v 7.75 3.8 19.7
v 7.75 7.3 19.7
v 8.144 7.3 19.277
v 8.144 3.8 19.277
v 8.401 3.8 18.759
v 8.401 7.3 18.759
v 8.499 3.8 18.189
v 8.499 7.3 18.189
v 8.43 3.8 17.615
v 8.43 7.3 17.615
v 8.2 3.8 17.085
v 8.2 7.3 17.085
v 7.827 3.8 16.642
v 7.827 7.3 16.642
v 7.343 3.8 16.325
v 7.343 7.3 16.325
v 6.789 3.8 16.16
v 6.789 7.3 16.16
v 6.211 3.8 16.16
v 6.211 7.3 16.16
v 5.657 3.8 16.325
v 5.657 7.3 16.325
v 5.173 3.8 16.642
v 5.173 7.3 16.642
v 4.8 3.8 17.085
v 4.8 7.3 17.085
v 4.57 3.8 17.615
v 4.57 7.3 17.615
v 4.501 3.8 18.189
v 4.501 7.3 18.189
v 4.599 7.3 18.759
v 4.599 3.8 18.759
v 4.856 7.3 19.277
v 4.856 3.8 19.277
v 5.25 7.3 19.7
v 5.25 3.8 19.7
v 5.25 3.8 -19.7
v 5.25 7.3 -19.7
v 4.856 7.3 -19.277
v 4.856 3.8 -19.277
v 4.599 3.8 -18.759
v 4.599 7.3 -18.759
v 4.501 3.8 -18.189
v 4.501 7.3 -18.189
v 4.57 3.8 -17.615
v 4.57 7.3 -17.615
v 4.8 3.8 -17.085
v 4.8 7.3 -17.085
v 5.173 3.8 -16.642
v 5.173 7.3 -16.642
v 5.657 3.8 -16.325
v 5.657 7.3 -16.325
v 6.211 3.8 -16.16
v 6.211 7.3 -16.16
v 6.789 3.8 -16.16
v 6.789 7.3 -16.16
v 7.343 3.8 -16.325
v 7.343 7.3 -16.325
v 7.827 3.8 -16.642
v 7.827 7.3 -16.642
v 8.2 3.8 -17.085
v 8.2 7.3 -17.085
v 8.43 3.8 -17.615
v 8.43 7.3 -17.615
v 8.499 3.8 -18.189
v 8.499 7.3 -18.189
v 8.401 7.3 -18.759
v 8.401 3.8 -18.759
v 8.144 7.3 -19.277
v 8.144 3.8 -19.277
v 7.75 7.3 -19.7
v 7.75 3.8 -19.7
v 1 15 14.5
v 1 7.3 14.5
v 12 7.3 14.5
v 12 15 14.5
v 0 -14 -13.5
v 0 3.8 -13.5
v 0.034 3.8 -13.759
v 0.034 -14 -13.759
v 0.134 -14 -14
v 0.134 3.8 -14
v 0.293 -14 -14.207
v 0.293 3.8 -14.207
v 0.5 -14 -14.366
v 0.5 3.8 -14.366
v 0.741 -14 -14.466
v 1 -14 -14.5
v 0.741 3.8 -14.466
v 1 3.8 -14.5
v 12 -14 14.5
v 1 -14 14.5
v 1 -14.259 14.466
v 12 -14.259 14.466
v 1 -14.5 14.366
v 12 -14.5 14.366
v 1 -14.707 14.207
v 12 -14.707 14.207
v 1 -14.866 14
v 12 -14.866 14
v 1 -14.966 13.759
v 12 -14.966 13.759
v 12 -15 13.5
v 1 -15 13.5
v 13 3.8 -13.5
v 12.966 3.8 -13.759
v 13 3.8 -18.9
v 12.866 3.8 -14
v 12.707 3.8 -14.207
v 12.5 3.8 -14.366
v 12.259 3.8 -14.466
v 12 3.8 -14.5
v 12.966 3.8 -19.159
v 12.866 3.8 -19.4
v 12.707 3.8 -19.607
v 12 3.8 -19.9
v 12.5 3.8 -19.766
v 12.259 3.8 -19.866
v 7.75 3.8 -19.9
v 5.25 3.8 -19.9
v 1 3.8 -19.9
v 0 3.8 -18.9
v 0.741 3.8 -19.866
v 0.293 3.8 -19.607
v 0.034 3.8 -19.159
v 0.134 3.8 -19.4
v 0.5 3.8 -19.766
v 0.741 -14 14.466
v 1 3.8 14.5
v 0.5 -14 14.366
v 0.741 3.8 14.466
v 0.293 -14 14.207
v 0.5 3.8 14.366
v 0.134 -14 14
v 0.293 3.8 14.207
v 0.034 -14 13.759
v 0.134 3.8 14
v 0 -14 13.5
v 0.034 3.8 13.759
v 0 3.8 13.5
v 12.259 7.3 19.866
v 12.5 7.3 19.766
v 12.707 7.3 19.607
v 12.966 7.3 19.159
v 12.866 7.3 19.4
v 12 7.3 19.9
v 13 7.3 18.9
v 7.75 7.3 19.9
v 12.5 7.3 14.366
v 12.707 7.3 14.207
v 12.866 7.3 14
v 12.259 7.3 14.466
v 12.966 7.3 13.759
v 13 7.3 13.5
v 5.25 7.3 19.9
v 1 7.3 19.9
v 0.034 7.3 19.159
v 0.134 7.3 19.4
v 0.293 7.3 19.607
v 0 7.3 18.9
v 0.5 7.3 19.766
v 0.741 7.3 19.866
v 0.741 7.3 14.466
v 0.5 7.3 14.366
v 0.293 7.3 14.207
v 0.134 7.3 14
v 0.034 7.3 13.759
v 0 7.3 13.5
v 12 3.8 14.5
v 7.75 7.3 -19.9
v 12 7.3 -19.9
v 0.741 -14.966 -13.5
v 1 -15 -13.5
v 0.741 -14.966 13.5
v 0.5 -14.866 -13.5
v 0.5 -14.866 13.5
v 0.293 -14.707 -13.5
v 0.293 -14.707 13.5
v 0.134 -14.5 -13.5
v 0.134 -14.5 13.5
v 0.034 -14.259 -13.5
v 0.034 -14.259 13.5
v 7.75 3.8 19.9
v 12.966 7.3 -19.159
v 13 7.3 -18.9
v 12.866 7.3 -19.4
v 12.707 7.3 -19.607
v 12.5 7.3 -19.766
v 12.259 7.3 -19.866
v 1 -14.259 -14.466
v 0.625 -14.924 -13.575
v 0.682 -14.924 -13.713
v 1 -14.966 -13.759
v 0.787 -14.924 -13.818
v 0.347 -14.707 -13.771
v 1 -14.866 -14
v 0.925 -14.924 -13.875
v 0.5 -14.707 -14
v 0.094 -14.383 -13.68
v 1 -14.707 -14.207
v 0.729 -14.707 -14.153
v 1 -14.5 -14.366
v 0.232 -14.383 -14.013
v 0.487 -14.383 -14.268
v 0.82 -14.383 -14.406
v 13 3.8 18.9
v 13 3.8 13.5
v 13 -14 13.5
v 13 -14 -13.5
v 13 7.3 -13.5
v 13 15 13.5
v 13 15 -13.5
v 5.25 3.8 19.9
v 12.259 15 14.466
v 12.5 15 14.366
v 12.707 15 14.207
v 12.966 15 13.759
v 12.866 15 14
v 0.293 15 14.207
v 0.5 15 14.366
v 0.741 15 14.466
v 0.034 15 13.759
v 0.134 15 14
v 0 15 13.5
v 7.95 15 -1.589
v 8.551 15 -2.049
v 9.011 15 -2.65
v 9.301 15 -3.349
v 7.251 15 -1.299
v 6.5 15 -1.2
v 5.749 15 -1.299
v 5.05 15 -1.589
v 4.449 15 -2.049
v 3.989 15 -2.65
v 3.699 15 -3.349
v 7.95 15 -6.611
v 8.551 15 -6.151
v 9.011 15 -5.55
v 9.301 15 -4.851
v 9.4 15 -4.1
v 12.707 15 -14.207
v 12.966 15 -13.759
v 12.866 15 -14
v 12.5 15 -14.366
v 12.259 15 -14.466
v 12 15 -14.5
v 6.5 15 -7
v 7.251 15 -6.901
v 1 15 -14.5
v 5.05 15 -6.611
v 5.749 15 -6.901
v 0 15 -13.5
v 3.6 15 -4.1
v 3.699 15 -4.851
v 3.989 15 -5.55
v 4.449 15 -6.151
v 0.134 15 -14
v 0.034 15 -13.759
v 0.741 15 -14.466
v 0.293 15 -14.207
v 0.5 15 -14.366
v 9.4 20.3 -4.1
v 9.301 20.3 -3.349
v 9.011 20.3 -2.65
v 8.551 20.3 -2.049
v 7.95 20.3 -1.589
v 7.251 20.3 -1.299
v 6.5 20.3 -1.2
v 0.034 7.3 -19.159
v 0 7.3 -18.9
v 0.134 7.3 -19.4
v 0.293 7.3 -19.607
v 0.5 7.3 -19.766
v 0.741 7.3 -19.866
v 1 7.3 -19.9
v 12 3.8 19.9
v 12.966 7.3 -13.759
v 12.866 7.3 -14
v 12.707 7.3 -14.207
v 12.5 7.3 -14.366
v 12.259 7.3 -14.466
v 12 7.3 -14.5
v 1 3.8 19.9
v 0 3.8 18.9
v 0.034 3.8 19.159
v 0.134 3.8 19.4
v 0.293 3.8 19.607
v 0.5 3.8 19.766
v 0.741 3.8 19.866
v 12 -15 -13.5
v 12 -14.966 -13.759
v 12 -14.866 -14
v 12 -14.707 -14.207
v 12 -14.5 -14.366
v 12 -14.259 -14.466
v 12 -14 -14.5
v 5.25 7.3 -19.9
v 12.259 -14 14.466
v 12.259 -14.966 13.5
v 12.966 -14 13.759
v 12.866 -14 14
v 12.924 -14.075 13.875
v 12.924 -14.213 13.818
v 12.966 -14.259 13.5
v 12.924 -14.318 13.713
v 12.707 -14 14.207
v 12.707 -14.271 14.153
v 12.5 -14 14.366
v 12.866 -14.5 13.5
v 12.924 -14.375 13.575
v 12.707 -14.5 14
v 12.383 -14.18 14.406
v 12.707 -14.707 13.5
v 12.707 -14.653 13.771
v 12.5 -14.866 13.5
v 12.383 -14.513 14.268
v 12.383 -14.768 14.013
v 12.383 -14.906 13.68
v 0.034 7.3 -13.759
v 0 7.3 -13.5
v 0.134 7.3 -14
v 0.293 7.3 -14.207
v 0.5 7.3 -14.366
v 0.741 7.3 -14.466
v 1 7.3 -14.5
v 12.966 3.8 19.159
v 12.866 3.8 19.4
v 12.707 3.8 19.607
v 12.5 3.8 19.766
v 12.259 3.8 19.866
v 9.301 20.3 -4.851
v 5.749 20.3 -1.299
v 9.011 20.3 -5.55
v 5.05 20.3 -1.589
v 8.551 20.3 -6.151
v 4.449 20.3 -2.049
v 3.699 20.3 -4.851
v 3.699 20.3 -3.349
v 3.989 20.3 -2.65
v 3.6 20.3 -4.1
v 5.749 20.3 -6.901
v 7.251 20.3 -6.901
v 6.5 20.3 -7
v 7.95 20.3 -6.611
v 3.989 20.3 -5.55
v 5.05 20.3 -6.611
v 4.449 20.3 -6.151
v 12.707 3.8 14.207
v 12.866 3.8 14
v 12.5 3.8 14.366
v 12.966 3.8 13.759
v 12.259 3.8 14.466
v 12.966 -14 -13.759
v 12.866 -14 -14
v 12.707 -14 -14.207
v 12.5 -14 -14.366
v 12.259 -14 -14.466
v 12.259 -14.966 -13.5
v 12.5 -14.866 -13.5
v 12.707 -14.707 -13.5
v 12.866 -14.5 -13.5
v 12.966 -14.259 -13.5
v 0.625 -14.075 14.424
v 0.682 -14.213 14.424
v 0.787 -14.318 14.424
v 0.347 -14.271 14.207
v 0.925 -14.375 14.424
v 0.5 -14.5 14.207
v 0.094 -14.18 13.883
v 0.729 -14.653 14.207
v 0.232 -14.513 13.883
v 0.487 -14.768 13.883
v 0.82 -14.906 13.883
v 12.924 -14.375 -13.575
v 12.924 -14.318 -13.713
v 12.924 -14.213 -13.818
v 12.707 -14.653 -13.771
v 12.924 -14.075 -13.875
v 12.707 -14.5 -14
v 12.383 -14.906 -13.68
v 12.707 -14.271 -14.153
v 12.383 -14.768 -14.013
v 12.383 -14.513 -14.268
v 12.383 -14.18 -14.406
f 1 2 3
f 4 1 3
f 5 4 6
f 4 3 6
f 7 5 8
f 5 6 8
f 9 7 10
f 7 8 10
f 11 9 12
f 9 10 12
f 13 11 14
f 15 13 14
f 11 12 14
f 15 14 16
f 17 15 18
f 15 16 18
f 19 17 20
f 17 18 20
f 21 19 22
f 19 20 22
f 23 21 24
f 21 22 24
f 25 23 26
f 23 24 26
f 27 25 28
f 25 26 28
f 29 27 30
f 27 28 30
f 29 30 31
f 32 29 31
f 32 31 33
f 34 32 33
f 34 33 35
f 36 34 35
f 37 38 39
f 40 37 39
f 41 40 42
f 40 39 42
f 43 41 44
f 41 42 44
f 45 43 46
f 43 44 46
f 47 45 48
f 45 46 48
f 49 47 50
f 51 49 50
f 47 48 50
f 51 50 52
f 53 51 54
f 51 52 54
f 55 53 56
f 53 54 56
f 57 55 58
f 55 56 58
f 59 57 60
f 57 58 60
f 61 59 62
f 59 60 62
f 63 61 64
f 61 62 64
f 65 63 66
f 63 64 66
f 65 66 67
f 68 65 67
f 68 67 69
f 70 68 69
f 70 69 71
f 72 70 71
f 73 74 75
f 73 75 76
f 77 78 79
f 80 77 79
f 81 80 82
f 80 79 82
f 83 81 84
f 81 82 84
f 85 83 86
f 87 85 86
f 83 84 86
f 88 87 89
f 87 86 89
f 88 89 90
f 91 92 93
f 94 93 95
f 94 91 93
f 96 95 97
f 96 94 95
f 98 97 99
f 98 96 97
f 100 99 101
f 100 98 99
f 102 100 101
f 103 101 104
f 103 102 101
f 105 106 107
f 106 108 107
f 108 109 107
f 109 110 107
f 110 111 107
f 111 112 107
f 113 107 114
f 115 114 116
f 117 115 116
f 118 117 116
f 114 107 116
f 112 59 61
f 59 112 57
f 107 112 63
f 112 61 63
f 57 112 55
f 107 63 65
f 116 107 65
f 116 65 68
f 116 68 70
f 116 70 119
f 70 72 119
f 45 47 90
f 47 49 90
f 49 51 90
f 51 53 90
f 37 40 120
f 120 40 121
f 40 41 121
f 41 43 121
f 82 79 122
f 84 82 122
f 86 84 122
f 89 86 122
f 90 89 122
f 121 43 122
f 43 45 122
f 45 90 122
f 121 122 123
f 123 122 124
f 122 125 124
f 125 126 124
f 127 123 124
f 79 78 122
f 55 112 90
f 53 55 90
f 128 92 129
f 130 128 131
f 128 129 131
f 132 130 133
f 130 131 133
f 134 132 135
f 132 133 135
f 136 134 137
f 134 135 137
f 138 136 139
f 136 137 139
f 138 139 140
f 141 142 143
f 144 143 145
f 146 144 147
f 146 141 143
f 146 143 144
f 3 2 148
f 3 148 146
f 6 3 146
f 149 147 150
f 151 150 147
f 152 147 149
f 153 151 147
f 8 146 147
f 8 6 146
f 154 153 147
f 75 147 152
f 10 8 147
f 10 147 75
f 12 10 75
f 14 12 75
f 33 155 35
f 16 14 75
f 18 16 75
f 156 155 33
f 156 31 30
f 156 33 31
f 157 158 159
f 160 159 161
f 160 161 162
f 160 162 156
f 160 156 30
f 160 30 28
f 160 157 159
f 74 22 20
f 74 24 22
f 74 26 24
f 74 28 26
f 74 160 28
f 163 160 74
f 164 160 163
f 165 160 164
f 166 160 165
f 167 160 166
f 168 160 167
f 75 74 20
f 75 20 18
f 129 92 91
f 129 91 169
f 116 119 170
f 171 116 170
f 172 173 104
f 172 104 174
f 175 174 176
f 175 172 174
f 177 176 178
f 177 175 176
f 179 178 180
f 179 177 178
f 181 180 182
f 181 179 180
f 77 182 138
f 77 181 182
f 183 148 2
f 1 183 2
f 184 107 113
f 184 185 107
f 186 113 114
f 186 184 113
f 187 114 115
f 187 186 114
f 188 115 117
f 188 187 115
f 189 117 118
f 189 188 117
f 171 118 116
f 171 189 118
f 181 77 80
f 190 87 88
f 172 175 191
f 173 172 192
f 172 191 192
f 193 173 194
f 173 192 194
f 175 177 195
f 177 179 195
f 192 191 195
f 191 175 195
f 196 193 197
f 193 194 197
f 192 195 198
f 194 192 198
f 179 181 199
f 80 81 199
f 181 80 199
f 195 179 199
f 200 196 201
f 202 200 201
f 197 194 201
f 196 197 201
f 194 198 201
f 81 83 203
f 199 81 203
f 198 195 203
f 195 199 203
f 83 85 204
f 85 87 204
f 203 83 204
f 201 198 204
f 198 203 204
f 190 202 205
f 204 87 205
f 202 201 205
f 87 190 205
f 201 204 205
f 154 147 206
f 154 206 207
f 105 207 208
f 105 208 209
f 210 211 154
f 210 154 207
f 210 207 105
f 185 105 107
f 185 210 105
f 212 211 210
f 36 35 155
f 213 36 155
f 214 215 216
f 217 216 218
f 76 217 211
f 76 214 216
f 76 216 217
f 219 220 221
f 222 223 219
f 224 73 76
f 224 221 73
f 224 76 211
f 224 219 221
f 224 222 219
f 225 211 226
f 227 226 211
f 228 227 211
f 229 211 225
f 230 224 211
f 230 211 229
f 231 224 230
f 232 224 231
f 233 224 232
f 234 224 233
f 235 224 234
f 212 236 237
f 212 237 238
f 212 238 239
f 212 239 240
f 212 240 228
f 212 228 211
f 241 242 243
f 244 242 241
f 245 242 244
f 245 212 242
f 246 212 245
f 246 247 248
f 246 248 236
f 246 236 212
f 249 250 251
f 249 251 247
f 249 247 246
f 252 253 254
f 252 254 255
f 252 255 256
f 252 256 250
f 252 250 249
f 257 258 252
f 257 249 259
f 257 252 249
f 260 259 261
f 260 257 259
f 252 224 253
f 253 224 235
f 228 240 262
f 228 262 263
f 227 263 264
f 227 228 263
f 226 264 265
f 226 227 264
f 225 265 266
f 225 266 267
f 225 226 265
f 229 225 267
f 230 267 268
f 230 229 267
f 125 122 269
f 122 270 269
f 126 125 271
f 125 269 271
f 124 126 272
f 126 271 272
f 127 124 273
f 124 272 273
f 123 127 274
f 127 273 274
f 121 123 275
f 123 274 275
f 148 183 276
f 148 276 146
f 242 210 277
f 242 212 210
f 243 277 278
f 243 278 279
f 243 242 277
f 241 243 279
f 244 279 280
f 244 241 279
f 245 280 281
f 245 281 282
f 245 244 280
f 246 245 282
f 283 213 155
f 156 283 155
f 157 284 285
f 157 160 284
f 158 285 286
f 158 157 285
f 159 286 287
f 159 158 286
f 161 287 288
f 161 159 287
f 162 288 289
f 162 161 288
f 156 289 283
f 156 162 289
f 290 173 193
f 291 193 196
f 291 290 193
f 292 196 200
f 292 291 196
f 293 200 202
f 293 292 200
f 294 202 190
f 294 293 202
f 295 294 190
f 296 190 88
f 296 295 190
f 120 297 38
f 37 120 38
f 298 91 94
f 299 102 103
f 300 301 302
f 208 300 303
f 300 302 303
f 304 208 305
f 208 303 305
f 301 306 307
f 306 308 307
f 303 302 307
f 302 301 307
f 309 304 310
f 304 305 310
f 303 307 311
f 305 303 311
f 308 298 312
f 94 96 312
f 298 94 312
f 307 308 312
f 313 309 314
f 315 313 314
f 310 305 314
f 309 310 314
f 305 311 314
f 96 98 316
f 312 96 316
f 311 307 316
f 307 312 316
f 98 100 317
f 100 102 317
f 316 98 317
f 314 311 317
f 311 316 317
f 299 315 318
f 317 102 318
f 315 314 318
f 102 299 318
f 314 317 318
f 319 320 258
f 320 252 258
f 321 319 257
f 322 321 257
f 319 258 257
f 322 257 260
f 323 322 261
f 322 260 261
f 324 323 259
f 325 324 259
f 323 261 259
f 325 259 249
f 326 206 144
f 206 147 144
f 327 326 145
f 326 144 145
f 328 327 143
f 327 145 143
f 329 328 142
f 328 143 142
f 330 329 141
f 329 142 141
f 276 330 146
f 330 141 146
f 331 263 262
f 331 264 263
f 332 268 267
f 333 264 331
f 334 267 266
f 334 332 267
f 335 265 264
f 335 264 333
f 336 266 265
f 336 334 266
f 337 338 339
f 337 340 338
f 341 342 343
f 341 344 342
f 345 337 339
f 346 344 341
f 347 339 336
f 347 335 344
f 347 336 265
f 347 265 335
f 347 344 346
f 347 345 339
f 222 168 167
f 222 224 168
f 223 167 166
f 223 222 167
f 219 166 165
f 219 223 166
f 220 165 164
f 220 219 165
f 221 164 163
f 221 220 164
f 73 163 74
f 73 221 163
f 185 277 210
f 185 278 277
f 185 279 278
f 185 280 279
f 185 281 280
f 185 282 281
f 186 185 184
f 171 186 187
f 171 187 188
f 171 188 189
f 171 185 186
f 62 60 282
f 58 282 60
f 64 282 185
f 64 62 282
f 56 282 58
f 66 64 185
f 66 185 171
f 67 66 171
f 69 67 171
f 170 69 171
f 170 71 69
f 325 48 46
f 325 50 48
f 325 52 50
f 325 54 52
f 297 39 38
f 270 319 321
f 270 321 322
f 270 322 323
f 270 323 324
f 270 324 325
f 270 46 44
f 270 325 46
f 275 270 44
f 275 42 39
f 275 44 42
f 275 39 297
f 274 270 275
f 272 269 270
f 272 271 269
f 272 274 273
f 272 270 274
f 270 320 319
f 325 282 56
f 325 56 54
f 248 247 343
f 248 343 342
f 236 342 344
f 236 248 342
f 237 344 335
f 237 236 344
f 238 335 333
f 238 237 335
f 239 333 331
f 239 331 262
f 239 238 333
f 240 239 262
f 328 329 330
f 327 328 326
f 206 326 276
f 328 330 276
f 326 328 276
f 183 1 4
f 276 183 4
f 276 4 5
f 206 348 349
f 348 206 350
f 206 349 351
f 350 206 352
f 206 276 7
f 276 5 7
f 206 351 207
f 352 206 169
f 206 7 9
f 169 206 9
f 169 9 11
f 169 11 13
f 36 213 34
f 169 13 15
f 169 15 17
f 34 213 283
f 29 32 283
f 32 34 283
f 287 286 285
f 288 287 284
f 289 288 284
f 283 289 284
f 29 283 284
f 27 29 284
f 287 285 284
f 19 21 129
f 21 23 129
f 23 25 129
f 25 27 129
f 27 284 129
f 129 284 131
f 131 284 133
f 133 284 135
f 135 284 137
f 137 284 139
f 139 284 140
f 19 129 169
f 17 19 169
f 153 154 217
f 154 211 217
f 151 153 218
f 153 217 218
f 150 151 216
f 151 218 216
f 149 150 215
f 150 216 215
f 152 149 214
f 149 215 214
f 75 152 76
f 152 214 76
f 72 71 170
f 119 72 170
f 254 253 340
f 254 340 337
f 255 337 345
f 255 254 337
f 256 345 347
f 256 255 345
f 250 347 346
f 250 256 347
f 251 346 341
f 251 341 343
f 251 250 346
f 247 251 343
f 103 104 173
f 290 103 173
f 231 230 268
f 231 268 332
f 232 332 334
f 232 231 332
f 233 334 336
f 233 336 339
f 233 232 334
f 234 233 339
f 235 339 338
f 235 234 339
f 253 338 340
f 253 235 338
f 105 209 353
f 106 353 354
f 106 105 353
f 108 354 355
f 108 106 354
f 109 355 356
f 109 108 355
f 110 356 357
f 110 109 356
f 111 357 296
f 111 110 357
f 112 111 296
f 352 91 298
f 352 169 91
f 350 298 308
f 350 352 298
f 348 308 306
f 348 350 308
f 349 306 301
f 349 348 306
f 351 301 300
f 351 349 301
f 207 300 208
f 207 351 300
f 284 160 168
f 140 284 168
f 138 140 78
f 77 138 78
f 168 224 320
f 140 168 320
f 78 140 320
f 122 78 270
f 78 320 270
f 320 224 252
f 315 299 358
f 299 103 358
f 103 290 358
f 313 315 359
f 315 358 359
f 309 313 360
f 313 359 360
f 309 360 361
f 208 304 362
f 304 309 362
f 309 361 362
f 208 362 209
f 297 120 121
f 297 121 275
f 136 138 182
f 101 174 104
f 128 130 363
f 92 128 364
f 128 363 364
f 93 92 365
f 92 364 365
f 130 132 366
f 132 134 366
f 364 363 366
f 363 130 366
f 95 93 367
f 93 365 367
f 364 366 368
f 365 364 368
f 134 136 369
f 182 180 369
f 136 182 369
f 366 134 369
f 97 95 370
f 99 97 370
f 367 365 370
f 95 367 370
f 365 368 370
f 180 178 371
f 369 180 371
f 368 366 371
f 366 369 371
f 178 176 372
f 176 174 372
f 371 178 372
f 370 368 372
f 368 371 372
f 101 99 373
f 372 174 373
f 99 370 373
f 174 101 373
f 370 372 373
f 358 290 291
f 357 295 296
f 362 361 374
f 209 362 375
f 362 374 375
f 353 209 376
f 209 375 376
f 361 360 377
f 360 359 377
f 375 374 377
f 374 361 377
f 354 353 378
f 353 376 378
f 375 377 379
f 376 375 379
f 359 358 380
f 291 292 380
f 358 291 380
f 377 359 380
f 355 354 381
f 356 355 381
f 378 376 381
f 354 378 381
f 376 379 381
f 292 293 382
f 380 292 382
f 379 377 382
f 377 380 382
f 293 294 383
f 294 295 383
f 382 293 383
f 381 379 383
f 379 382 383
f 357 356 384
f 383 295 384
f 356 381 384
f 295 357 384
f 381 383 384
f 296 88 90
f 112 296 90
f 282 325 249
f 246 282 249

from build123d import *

# Parameters (mm, degrees)
SKETCH2_W           = 29
SKETCH2_H           = 30
SKETCH2_W_2         = 5.4
SKETCH2_H_2         = 3.5
SKETCH2_W_3         = 5.8
SKETCH2_H_3         = 5.3
BOSS_EXTRUDE1_DEPTH = 13
CUT_EXTRUDE1_DEPTH  = 5.3
CUT_EXTRUDE2_DEPTH  = 31
FILLET1_R           = 1


with BuildPart() as part:
    # Sketch2 → Boss-Extrude1 (new body)
    with BuildSketch(Plane(origin=(0, 0, 0), x_dir=(0, 0, -1), z_dir=(1, 0, 0))):
        Rectangle(SKETCH2_W, SKETCH2_H)
        with Locations((-17.2, 5.55)):
            Rectangle(SKETCH2_W_2, SKETCH2_H_2)
        with Locations((4.1, 17.65)):
            Rectangle(SKETCH2_W_3, SKETCH2_H_3)
        with Locations((17.2, 5.55)):
            Rectangle(SKETCH2_W_2, SKETCH2_H_2)
    extrude(amount=BOSS_EXTRUDE1_DEPTH)

    # Sketch3 → Cut-Extrude1 (cut)
    with BuildSketch(Plane(origin=(0, 15, 0), x_dir=(1, 0, 0), z_dir=(0, 1, 0))):
        with BuildLine():
            Line((6.5, 1.2), (9.4, 1.2))
            Line((9.4, 1.2), (9.4, 4.1))
            ThreePointArc((9.4, 4.1), (8.550609665, 2.049390335), (6.5, 1.2))
        make_face()
        with BuildLine():
            ThreePointArc((6.5, 7), (8.550609665, 6.150609665), (9.4, 4.1))
            Line((9.4, 4.1), (9.4, 7))
            Line((9.4, 7), (6.5, 7))
        make_face()
        with BuildLine():
            ThreePointArc((3.6, 4.1), (4.449390335, 6.150609665), (6.5, 7))
            Line((6.5, 7), (3.6, 7))
            Line((3.6, 7), (3.6, 4.1))
        make_face()
        with BuildLine():
            Line((3.6, 1.2), (6.5, 1.2))
            ThreePointArc((6.5, 1.2), (4.449390335, 2.049390335), (3.6, 4.1))
            Line((3.6, 4.1), (3.6, 1.2))
        make_face()
        Polygon((0, 1.2), (3.6, 1.2), (3.6, 4.1), (3.6, 7), (0, 7), align=None)
        Polygon((9.4, 1.2), (13, 1.2), (13, 7), (9.4, 7), (9.4, 4.1), align=None)
        with BuildLine():
            Line((7.75, 19.7), (7.75, 19.9))
            Line((7.75, 19.9), (5.25, 19.9))
            Line((5.25, 19.9), (5.25, 19.7))
            ThreePointArc((5.25, 19.7), (6.5, 16.1387505), (7.75, 19.7))
        make_face()
        with BuildLine():
            Line((5.25, -19.9), (7.75, -19.9))
            Line((7.75, -19.9), (7.75, -19.7))
            ThreePointArc((7.75, -19.7), (6.5, -16.1387505), (5.25, -19.7))
            Line((5.25, -19.7), (5.25, -19.9))
        make_face()
    extrude(amount=CUT_EXTRUDE1_DEPTH, mode=Mode.SUBTRACT)

    # Sketch3<4> → Cut-Extrude2 (cut, through all)
    with BuildSketch(Plane(origin=(0, 15, 0), x_dir=(1, 0, 0), z_dir=(0, 1, 0))):
        with BuildLine():
            Line((7.75, 19.7), (7.75, 19.9))
            Line((7.75, 19.9), (5.25, 19.9))
            Line((5.25, 19.9), (5.25, 19.7))
            ThreePointArc((5.25, 19.7), (6.5, 16.1387505), (7.75, 19.7))
        make_face()
        with BuildLine():
            Line((5.25, -19.9), (7.75, -19.9))
            Line((7.75, -19.9), (7.75, -19.7))
            ThreePointArc((7.75, -19.7), (6.5, -16.1387505), (5.25, -19.7))
            Line((5.25, -19.7), (5.25, -19.9))
        make_face()
    extrude(amount=-CUT_EXTRUDE2_DEPTH, mode=Mode.SUBTRACT)

    # Fillet1
    fillet1_edges = [part.edges().sort_by_distance(p)[0] for p in [
        (0, 5.55, -19.9),
        (0, -5.6, -14.5),
        (0, -15, 0),
        (0, -5.6, 14.5),
        (0, 5.55, 19.9),
        (0, 11.15, 14.5),
        (0, 11.15, -14.5),
        (6.5, -15, -14.5),
        (6.5, -15, 14.5),
        (13, 11.15, 14.5),
        (13, 5.55, 19.9),
        (13, 11.15, -14.5),
        (13, -5.6, 14.5),
        (13, -15, 0),
        (13, -5.6, -14.5),
        (13, 5.55, -19.9),
    ]]
    fillet(fillet1_edges, radius=FILLET1_R)


solid = part.part
